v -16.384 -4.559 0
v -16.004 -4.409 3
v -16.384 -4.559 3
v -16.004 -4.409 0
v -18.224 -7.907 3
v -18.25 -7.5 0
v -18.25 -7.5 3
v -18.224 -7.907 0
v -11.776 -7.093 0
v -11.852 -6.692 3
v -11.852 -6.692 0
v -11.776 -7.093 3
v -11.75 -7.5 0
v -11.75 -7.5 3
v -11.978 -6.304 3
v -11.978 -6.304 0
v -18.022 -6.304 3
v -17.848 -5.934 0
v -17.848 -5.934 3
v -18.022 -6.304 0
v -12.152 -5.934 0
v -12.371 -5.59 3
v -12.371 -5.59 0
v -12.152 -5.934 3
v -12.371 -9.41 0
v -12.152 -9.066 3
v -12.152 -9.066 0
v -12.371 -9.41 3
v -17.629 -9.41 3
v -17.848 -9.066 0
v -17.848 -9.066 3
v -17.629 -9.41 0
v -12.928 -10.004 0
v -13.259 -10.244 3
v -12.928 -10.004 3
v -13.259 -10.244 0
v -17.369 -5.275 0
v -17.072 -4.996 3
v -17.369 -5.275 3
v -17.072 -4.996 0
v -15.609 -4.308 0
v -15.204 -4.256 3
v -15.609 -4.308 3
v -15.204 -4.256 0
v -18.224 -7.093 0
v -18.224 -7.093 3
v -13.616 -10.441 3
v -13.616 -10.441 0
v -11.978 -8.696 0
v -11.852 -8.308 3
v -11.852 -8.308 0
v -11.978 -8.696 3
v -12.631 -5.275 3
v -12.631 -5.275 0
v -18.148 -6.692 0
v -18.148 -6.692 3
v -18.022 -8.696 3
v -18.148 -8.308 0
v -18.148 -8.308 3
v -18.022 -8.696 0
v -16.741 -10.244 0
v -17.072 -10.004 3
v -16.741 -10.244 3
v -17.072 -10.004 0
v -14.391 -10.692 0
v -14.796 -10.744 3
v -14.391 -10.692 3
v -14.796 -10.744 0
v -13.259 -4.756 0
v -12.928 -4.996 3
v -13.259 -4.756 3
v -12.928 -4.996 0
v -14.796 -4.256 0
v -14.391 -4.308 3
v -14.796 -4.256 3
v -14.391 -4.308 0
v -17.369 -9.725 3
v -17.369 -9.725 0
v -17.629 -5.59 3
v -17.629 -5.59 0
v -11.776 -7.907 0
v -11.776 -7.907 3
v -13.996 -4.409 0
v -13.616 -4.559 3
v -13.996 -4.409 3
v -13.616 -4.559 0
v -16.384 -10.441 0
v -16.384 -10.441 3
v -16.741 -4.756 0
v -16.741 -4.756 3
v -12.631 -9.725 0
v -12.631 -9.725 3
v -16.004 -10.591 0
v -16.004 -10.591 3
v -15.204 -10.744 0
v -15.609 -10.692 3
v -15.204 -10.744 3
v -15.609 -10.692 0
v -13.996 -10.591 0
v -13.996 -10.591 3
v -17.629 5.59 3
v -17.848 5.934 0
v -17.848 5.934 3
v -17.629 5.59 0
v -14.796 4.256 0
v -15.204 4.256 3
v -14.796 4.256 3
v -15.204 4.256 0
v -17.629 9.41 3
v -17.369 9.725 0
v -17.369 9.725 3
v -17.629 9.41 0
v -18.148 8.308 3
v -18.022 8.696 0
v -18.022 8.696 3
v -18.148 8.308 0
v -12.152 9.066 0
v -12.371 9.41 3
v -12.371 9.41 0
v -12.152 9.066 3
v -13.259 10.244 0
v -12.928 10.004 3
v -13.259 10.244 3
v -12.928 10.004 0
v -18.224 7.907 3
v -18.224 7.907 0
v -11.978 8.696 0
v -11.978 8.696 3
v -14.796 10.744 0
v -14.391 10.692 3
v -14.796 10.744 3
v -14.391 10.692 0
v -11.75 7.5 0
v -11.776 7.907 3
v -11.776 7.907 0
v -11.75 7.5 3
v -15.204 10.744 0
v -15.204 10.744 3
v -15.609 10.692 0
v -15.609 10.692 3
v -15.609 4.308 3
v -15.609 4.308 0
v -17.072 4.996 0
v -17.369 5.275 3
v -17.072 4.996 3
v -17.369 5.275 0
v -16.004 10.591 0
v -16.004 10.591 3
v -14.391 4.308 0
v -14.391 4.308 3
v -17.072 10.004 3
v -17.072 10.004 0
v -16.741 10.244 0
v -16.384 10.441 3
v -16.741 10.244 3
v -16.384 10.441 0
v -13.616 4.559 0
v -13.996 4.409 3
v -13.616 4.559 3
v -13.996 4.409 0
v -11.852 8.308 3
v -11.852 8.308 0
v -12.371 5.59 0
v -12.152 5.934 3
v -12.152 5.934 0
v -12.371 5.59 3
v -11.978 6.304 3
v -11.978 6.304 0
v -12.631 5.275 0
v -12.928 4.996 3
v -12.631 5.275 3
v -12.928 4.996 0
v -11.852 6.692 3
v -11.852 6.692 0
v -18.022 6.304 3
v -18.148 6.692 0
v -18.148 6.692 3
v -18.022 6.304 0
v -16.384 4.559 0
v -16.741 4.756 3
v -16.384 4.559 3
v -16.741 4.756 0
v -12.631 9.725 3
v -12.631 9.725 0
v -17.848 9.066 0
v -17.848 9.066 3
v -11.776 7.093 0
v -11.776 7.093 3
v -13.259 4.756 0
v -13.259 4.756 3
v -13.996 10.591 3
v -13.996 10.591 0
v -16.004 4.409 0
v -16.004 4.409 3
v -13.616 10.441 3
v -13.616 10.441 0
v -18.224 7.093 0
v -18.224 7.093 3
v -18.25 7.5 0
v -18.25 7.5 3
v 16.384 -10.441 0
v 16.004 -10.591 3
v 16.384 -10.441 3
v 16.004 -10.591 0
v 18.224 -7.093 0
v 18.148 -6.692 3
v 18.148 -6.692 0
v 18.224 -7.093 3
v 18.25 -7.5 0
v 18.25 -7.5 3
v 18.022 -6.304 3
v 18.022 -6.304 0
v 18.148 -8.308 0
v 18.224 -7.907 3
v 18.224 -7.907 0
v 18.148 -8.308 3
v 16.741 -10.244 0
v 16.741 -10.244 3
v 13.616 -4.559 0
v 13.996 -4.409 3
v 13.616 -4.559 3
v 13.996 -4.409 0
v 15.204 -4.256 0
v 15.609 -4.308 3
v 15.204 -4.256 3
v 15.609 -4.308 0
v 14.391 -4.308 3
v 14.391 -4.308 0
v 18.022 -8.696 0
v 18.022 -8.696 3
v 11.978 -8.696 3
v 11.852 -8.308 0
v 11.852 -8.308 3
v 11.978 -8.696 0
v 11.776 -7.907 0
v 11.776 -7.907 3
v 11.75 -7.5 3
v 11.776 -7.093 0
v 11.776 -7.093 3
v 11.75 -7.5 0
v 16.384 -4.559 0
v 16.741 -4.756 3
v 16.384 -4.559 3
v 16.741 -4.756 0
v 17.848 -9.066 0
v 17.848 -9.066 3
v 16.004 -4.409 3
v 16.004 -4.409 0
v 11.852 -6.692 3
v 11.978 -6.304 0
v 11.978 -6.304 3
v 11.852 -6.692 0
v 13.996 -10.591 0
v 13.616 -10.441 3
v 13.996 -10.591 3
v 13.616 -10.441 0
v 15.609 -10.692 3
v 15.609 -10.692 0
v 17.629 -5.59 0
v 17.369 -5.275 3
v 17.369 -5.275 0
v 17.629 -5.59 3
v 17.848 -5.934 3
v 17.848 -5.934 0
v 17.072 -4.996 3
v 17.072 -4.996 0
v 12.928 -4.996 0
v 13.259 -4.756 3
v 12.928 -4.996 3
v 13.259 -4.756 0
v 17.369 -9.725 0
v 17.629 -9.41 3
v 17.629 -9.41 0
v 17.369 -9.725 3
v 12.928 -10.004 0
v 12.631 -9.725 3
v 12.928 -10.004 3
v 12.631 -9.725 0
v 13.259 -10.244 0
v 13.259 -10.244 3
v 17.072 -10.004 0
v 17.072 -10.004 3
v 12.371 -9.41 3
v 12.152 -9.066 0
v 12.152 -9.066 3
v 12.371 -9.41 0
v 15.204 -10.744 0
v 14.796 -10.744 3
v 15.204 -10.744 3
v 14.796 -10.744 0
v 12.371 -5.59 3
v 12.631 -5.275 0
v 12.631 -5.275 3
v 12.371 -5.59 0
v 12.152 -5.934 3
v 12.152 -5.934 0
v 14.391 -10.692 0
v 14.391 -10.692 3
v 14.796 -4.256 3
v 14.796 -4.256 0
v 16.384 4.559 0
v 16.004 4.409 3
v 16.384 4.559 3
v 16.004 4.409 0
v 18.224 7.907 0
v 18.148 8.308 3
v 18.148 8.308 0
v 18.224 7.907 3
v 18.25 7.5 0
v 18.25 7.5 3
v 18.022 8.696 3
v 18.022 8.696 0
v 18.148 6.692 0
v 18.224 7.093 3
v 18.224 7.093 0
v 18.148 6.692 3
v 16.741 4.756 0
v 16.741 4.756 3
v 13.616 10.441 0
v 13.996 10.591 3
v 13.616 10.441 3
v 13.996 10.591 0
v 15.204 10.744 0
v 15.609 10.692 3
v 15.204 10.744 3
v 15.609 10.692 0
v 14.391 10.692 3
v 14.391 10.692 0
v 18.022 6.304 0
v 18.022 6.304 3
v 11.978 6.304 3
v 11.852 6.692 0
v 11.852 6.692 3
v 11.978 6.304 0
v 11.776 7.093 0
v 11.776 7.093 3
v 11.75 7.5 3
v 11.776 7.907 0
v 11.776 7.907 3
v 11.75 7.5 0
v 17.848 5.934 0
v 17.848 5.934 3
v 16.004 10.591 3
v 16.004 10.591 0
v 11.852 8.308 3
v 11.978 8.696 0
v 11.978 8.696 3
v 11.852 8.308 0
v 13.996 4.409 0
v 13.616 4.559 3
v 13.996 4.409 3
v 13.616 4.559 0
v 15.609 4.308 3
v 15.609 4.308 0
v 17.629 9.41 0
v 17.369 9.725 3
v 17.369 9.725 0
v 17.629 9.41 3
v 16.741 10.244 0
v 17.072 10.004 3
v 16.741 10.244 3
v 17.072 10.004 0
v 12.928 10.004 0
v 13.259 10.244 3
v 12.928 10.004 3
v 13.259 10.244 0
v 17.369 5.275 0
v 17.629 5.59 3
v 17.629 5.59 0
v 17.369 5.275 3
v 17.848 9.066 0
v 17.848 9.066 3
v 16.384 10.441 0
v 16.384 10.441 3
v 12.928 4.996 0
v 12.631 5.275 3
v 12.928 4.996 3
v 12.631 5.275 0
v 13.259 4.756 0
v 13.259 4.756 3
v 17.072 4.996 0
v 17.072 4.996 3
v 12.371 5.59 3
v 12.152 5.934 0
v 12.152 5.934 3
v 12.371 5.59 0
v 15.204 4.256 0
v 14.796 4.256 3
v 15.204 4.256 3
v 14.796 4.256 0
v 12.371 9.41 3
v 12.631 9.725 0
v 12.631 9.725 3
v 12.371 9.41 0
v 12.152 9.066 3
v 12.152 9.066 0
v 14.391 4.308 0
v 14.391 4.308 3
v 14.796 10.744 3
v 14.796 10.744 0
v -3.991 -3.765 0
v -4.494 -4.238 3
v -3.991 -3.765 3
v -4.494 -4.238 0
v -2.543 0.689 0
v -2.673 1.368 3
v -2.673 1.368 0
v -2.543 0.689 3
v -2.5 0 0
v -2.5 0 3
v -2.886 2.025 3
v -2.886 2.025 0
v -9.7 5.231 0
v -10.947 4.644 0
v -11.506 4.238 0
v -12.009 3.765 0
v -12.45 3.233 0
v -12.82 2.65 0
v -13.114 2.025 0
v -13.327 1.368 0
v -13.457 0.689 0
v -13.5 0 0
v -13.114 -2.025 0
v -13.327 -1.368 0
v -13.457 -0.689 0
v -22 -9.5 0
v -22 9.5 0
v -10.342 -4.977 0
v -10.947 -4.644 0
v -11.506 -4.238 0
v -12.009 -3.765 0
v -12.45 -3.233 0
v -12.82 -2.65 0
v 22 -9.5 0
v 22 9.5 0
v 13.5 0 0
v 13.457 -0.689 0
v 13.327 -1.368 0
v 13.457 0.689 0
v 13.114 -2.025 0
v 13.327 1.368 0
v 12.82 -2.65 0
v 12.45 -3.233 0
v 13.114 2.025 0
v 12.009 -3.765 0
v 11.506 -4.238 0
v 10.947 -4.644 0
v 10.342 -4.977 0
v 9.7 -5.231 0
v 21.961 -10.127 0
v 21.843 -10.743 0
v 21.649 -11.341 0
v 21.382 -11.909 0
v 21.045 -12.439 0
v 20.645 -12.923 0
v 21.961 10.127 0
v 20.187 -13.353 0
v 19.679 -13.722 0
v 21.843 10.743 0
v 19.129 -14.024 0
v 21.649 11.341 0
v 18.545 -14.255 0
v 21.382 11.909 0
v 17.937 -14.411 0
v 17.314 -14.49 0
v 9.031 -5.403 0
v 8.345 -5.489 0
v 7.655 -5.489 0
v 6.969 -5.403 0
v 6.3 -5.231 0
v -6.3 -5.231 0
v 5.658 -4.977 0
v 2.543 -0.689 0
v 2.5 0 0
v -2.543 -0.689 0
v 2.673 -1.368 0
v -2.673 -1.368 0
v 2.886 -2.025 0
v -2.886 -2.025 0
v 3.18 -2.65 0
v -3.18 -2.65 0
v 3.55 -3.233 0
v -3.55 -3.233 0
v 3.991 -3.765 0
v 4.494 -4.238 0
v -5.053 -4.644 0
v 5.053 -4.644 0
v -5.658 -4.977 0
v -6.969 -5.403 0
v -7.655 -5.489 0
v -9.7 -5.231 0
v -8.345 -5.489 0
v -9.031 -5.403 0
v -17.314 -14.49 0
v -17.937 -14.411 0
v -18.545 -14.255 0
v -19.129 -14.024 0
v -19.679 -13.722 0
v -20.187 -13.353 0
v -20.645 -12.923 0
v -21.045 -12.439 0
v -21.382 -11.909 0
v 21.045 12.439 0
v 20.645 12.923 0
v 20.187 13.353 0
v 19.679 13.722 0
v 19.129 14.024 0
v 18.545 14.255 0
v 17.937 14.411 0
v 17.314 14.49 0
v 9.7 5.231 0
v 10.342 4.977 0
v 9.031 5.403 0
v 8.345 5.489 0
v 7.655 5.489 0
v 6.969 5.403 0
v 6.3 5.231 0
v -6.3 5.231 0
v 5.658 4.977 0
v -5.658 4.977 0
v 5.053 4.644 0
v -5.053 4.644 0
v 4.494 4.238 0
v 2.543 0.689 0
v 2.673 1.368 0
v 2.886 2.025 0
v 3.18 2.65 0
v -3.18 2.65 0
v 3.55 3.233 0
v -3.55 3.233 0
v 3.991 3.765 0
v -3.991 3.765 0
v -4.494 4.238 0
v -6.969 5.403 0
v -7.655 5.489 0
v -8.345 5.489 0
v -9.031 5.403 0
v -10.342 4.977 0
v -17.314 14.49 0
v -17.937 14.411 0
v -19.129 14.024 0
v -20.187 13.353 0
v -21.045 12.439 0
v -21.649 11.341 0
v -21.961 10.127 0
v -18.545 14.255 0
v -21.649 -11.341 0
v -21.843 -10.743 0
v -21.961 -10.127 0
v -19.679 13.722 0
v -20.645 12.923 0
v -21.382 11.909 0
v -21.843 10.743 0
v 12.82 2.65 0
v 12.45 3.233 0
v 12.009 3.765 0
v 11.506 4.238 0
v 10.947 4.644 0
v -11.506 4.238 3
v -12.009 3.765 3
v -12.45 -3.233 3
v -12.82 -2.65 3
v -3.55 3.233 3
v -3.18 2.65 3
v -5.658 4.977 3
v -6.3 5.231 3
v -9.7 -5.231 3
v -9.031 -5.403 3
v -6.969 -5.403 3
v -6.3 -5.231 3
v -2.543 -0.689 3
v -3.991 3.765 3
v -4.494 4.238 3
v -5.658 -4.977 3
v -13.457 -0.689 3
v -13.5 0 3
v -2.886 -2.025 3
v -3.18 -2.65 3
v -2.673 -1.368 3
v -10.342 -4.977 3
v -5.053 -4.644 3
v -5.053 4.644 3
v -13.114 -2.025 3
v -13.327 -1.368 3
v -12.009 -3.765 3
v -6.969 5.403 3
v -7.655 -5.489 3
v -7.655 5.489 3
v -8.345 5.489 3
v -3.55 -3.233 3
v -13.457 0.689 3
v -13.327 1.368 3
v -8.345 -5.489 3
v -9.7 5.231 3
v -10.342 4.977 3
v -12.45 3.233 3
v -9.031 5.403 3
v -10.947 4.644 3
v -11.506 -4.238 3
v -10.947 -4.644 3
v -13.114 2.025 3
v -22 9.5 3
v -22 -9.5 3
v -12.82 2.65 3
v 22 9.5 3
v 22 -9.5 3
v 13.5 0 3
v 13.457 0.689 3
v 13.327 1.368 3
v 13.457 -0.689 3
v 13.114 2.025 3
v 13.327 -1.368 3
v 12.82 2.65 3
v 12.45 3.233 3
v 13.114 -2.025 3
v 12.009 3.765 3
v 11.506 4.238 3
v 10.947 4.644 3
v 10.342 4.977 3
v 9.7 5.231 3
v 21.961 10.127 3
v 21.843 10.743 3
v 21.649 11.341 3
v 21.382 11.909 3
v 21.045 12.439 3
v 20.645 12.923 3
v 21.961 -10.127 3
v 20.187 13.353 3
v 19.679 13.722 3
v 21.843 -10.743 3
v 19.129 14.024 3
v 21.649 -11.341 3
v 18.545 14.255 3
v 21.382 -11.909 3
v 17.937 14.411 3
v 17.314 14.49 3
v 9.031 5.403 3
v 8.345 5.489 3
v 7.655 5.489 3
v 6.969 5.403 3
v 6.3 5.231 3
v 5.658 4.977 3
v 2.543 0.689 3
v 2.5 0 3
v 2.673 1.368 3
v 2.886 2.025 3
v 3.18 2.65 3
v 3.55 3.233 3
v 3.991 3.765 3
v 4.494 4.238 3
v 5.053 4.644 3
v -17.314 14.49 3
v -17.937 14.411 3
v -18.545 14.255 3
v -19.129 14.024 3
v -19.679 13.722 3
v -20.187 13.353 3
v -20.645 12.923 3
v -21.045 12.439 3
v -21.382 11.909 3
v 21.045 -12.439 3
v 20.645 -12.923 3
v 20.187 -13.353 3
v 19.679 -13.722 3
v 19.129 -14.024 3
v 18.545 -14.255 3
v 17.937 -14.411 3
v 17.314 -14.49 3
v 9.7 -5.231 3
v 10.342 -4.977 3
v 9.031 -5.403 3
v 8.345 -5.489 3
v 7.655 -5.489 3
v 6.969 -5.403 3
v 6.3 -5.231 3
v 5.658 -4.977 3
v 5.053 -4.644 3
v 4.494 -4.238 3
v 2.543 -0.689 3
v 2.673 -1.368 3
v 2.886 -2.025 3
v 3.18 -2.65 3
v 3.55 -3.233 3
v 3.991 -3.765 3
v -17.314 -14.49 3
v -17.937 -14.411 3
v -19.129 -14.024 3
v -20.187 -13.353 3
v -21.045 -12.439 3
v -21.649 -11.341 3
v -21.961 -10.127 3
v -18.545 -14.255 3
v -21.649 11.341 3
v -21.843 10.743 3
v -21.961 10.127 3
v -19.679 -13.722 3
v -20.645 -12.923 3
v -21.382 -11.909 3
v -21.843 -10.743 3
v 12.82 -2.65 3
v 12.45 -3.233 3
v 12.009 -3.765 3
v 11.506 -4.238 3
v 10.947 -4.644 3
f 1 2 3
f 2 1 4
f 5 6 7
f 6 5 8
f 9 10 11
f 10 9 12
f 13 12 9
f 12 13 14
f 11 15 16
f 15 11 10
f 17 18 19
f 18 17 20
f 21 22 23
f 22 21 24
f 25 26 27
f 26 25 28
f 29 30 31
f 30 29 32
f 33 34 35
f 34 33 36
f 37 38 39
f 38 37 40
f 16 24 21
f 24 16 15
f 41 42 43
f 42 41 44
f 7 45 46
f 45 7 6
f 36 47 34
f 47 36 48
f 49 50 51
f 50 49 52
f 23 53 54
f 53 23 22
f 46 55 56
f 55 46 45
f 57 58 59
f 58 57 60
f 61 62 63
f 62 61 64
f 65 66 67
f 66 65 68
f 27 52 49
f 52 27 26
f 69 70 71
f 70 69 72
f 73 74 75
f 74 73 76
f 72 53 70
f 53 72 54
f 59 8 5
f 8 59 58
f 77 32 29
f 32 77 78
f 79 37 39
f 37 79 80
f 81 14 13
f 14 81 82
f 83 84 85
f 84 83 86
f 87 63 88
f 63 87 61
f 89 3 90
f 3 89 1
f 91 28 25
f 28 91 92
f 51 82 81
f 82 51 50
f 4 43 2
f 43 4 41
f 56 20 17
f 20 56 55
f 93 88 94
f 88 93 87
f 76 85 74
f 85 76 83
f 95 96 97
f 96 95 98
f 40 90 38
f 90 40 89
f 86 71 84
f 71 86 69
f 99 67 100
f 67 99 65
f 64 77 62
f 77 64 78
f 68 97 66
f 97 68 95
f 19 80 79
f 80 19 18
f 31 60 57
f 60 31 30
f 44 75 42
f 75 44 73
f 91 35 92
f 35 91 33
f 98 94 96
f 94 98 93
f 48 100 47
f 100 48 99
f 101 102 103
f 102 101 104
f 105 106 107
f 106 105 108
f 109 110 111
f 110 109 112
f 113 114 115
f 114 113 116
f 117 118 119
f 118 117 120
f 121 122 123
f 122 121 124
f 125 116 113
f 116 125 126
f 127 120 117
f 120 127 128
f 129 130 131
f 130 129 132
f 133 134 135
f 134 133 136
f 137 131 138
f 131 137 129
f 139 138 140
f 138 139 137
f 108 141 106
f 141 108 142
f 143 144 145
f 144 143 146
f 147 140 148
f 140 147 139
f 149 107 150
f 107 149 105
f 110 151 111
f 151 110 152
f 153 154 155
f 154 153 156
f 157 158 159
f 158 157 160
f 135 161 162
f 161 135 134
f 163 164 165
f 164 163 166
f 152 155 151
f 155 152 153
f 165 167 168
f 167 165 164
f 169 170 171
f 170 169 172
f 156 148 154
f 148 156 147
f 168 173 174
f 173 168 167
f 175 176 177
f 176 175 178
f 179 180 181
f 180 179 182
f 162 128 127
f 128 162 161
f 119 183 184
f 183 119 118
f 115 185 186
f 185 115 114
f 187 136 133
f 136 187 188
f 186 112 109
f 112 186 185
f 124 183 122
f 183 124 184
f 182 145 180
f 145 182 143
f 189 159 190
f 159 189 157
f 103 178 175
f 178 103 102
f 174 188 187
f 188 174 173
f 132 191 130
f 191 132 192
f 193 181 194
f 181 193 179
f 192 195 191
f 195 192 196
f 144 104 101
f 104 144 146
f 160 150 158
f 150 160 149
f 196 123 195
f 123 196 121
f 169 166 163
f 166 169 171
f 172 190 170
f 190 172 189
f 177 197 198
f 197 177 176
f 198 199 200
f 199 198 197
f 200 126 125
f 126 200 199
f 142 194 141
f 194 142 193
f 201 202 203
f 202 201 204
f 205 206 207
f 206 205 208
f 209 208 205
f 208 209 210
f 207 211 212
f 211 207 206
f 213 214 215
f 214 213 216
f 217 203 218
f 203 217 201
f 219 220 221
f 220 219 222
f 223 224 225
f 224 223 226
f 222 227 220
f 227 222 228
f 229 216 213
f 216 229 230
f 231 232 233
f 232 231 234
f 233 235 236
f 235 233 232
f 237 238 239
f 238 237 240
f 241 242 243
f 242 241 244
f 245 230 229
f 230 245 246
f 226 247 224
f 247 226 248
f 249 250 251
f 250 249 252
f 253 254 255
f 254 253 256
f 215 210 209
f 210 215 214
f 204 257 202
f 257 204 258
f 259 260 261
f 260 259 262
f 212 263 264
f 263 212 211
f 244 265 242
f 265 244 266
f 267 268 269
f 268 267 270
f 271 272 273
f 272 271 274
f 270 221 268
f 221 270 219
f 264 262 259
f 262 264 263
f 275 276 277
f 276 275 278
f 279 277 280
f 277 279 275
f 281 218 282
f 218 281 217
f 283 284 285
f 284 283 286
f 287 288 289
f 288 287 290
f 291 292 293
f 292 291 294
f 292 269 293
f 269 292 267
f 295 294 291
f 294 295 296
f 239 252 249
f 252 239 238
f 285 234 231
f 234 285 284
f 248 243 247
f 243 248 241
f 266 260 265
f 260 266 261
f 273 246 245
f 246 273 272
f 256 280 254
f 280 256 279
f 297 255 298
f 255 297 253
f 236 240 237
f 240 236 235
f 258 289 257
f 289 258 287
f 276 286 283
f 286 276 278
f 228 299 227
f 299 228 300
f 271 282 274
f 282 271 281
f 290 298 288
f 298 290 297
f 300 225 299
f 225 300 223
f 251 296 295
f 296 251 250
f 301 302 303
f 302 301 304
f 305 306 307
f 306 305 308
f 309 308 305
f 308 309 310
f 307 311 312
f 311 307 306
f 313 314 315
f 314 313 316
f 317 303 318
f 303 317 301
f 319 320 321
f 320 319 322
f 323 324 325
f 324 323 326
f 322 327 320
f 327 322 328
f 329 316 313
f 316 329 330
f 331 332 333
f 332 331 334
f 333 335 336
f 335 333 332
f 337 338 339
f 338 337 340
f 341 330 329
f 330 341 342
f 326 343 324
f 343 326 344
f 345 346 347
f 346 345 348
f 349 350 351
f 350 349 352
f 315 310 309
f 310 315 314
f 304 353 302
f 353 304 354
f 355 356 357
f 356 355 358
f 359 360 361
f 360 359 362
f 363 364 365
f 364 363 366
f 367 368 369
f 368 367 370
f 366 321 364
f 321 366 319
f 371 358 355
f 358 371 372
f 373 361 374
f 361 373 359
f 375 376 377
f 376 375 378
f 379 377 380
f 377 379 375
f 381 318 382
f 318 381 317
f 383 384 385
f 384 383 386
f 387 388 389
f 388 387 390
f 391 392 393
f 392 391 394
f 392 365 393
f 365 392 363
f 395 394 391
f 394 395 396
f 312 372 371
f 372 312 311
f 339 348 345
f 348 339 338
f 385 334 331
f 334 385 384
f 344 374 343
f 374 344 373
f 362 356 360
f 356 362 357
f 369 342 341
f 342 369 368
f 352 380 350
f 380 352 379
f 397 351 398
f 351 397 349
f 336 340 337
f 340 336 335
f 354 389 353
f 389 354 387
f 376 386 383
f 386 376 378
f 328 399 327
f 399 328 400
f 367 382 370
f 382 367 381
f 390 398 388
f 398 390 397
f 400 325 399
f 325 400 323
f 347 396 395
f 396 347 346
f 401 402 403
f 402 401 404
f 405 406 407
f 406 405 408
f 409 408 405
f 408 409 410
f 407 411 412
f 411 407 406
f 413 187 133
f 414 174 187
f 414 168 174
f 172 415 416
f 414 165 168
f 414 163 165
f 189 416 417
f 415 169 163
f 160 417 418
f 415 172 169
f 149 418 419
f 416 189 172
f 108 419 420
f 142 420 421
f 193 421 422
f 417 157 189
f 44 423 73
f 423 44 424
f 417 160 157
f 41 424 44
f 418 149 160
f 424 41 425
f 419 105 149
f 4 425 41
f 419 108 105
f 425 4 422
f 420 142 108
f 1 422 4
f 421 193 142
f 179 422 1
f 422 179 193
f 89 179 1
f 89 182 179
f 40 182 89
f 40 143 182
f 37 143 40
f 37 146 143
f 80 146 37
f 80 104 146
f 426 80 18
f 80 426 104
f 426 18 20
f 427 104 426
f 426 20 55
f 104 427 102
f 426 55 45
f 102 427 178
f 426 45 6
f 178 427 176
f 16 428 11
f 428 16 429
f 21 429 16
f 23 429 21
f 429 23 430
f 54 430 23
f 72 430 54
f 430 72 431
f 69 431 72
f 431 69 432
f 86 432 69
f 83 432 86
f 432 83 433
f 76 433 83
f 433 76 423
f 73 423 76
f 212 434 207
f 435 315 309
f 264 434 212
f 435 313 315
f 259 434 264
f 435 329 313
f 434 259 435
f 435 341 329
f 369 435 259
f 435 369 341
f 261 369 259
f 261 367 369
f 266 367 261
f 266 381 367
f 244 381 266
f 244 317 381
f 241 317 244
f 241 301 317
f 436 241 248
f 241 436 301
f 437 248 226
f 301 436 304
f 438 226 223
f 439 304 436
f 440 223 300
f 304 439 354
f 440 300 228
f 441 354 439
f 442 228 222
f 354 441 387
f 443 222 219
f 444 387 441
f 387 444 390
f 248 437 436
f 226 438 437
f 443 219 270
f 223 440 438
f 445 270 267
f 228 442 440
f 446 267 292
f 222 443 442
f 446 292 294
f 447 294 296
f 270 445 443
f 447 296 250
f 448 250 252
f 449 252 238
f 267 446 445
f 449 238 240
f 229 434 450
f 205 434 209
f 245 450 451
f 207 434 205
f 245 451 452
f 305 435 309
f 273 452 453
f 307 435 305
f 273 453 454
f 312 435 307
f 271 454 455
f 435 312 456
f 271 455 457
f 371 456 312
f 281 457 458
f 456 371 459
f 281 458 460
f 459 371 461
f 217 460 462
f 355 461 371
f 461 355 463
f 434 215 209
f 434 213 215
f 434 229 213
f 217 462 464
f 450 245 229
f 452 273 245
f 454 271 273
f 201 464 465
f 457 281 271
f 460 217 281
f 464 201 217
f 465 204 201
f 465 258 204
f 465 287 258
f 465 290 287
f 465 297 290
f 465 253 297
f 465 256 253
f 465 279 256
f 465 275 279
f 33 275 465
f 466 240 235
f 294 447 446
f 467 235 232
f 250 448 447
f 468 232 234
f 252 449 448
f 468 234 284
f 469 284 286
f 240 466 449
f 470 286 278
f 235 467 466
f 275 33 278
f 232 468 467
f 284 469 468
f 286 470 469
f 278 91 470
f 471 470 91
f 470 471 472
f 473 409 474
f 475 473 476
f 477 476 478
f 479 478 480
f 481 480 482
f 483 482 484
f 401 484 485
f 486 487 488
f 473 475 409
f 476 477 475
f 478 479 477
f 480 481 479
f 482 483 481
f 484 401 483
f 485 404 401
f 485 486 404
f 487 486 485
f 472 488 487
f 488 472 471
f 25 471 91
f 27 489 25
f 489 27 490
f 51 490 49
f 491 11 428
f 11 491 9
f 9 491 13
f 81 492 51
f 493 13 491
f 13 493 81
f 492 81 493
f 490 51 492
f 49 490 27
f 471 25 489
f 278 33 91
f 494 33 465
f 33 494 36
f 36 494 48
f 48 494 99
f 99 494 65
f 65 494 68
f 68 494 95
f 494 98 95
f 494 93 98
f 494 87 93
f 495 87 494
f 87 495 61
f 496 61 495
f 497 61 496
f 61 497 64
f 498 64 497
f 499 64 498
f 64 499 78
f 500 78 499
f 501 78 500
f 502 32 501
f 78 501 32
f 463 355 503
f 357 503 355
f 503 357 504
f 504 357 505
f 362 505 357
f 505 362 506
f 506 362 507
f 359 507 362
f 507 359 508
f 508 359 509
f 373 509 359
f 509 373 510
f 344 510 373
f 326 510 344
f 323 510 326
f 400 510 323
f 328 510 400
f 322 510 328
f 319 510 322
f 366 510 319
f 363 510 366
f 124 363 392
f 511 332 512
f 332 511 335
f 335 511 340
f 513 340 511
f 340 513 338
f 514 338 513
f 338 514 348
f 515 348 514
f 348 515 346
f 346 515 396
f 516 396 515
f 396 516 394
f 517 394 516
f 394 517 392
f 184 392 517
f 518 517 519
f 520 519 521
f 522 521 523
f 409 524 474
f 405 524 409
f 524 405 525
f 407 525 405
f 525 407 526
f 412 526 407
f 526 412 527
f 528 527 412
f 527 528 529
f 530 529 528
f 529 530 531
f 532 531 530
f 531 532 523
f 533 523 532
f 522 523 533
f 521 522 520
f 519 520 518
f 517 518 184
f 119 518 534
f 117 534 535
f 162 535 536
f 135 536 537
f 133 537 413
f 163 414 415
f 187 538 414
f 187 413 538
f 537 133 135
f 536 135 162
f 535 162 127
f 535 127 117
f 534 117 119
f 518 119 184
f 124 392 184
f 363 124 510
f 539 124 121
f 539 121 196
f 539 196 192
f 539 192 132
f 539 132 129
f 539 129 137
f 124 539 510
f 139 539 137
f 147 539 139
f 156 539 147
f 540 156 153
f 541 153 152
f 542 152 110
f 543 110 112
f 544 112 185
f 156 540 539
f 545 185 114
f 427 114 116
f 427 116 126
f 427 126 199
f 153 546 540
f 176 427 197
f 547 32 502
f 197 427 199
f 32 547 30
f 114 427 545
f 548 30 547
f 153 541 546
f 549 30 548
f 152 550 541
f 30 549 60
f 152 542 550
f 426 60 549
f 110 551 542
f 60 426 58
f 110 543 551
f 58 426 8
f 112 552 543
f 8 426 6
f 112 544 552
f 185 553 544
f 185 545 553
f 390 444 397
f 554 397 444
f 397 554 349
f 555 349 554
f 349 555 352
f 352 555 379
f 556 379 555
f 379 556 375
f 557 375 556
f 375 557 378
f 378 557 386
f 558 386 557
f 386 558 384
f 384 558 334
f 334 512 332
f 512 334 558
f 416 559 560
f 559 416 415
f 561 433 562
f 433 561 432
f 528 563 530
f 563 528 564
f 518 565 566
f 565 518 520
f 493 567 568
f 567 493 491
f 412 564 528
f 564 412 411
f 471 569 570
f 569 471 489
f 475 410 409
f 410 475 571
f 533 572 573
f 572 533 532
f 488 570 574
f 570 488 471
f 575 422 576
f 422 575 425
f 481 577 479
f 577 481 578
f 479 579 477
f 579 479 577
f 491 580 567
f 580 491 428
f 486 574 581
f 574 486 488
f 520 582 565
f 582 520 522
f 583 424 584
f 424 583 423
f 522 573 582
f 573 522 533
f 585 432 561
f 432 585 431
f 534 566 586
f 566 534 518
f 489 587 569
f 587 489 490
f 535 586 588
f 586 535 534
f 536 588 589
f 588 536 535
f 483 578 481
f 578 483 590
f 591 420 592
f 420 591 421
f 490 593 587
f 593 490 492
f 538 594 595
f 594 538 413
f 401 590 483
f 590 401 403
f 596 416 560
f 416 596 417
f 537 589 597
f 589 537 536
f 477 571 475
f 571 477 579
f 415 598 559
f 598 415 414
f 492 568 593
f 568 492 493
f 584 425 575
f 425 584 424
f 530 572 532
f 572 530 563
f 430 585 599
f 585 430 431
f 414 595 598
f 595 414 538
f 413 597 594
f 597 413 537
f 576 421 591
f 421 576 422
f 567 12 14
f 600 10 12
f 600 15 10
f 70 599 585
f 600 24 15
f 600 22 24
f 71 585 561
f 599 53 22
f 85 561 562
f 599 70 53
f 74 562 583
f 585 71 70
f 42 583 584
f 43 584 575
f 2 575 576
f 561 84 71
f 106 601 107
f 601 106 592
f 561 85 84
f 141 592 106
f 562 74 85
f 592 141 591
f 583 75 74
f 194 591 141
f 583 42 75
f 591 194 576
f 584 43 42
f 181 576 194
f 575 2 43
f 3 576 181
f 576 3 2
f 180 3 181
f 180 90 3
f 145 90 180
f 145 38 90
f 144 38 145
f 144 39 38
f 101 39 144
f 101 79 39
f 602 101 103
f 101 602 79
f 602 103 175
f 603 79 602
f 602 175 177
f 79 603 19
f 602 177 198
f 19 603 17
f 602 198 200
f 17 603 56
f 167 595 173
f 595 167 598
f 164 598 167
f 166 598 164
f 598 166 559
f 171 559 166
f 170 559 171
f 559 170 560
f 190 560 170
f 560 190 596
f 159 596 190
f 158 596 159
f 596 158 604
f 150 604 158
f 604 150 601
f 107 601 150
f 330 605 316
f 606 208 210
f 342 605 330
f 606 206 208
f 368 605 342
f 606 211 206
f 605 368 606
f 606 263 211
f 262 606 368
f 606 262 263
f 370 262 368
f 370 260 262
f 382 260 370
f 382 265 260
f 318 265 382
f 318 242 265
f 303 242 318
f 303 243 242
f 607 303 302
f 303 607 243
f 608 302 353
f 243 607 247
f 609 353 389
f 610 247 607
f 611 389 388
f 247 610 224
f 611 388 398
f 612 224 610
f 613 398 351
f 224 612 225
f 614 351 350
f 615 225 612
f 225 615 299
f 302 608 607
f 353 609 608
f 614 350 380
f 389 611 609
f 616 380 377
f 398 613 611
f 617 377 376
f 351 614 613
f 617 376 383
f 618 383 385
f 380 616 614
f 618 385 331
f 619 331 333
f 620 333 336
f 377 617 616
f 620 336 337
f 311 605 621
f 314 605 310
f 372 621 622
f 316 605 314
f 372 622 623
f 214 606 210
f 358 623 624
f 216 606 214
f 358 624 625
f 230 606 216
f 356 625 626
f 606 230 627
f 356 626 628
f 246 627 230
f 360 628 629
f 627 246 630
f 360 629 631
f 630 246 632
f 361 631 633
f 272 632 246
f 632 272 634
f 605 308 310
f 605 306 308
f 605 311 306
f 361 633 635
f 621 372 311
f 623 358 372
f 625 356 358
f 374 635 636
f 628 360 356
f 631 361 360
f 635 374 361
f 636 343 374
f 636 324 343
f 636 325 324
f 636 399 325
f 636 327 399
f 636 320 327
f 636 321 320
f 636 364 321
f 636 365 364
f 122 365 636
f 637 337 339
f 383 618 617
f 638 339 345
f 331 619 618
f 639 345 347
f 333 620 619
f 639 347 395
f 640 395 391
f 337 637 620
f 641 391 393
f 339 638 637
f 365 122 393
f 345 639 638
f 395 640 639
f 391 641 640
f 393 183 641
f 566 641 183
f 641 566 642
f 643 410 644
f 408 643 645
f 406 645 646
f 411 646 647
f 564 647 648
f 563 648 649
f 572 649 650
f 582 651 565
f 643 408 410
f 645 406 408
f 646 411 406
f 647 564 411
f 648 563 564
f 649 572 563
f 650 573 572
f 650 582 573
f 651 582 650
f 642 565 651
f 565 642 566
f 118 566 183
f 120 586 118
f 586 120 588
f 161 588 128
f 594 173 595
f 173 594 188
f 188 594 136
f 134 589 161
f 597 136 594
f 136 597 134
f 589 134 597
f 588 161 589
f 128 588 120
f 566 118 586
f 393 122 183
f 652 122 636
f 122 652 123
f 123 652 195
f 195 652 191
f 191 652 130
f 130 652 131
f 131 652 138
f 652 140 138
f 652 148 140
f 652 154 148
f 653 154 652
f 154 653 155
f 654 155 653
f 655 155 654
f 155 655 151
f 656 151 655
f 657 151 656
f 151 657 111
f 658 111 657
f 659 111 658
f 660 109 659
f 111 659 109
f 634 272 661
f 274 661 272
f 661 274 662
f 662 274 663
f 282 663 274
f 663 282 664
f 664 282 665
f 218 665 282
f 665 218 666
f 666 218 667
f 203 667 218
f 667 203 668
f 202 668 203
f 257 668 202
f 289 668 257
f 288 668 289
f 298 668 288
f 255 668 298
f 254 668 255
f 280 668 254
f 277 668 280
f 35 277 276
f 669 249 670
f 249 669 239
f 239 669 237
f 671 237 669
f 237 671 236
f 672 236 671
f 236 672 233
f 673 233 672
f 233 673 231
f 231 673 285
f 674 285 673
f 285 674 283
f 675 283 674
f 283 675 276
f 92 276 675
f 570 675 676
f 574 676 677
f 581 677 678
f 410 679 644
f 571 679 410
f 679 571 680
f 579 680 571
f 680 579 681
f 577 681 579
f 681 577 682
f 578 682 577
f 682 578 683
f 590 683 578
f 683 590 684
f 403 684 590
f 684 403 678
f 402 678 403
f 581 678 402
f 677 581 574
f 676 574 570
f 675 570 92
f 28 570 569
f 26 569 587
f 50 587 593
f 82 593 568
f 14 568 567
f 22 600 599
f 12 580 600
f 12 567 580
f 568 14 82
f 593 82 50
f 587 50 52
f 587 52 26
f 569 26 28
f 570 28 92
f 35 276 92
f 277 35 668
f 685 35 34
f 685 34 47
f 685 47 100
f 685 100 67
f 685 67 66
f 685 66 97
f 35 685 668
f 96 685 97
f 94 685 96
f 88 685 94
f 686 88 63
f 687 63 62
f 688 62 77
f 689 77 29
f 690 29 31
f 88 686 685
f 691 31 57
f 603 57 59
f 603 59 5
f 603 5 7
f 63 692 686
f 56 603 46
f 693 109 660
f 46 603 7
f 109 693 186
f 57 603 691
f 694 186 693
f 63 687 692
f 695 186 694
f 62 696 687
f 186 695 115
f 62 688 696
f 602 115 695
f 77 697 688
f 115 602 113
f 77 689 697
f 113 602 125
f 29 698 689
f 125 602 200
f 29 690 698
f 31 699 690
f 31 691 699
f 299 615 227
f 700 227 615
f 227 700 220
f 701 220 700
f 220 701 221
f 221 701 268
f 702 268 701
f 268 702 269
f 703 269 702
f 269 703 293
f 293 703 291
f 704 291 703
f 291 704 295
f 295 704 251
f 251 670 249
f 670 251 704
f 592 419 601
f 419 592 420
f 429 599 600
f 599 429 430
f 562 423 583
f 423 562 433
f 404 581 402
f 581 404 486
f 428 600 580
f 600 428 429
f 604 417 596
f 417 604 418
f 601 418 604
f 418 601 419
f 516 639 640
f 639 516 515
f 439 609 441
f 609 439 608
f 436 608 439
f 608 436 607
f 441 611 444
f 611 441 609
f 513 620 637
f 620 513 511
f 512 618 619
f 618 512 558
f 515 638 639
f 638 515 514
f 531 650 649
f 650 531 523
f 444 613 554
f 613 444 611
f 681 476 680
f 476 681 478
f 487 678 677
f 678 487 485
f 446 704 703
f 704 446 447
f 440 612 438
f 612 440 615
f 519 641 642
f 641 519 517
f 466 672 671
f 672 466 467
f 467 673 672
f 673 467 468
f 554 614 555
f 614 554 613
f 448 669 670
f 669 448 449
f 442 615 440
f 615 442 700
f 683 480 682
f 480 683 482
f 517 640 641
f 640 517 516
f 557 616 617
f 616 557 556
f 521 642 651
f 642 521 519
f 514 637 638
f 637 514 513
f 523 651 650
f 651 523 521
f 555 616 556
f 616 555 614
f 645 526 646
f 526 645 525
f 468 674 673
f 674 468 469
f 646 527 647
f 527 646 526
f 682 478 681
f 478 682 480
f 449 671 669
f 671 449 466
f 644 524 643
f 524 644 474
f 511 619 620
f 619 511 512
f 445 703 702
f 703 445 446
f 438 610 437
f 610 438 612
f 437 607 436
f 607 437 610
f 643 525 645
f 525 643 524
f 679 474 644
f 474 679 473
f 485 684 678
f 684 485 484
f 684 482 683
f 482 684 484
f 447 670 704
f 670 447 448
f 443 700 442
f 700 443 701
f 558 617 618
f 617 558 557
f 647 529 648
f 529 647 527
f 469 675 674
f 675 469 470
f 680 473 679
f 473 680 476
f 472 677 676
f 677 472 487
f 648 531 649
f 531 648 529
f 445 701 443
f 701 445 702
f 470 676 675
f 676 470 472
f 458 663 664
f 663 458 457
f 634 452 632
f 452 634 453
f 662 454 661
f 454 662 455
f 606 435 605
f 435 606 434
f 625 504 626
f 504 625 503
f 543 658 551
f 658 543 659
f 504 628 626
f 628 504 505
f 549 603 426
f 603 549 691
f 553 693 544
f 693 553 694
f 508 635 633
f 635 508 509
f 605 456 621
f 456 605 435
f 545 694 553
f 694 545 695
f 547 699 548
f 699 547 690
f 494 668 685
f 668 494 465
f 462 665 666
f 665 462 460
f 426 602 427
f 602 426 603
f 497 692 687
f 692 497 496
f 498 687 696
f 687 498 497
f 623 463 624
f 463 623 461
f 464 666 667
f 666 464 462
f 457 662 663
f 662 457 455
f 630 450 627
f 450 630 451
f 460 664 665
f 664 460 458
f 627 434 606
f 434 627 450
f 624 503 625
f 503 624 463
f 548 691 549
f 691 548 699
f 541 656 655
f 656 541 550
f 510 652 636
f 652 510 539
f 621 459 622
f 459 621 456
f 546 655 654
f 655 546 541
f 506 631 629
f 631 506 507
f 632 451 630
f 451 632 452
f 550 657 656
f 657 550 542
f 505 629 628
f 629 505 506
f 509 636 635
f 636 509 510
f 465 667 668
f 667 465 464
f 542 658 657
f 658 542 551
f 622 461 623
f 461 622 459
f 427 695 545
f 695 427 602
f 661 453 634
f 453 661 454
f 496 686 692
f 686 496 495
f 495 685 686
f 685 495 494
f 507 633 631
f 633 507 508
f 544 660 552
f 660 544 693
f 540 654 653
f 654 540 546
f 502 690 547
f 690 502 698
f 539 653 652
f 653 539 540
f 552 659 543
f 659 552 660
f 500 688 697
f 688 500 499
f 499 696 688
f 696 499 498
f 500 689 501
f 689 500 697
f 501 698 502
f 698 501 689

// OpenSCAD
$fn = 50;


difference() {
	union() {
		hull() {
			translate(v = [-17.0000000000, 9.5000000000, 0]) {
				cylinder(h = 3, r = 5);
			}
			translate(v = [17.0000000000, 9.5000000000, 0]) {
				cylinder(h = 3, r = 5);
			}
			translate(v = [-17.0000000000, -9.5000000000, 0]) {
				cylinder(h = 3, r = 5);
			}
			translate(v = [17.0000000000, -9.5000000000, 0]) {
				cylinder(h = 3, r = 5);
			}
		}
	}
	union() {
		#translate(v = [-15.0000000000, -7.5000000000, -100.0000000000]) {
			cylinder(h = 200, r = 3.2500000000);
		}
		#translate(v = [-15.0000000000, 7.5000000000, -100.0000000000]) {
			cylinder(h = 200, r = 3.2500000000);
		}
		#translate(v = [15.0000000000, -7.5000000000, -100.0000000000]) {
			cylinder(h = 200, r = 3.2500000000);
		}
		#translate(v = [15.0000000000, 7.5000000000, -100.0000000000]) {
			cylinder(h = 200, r = 3.2500000000);
		}
		#translate(v = [-8.0000000000, 0, 0]) {
			cylinder(h = 3, r = 5.5000000000);
		}
		#translate(v = [8.0000000000, 0, 0]) {
			cylinder(h = 3, r = 5.5000000000);
		}
	}
}
